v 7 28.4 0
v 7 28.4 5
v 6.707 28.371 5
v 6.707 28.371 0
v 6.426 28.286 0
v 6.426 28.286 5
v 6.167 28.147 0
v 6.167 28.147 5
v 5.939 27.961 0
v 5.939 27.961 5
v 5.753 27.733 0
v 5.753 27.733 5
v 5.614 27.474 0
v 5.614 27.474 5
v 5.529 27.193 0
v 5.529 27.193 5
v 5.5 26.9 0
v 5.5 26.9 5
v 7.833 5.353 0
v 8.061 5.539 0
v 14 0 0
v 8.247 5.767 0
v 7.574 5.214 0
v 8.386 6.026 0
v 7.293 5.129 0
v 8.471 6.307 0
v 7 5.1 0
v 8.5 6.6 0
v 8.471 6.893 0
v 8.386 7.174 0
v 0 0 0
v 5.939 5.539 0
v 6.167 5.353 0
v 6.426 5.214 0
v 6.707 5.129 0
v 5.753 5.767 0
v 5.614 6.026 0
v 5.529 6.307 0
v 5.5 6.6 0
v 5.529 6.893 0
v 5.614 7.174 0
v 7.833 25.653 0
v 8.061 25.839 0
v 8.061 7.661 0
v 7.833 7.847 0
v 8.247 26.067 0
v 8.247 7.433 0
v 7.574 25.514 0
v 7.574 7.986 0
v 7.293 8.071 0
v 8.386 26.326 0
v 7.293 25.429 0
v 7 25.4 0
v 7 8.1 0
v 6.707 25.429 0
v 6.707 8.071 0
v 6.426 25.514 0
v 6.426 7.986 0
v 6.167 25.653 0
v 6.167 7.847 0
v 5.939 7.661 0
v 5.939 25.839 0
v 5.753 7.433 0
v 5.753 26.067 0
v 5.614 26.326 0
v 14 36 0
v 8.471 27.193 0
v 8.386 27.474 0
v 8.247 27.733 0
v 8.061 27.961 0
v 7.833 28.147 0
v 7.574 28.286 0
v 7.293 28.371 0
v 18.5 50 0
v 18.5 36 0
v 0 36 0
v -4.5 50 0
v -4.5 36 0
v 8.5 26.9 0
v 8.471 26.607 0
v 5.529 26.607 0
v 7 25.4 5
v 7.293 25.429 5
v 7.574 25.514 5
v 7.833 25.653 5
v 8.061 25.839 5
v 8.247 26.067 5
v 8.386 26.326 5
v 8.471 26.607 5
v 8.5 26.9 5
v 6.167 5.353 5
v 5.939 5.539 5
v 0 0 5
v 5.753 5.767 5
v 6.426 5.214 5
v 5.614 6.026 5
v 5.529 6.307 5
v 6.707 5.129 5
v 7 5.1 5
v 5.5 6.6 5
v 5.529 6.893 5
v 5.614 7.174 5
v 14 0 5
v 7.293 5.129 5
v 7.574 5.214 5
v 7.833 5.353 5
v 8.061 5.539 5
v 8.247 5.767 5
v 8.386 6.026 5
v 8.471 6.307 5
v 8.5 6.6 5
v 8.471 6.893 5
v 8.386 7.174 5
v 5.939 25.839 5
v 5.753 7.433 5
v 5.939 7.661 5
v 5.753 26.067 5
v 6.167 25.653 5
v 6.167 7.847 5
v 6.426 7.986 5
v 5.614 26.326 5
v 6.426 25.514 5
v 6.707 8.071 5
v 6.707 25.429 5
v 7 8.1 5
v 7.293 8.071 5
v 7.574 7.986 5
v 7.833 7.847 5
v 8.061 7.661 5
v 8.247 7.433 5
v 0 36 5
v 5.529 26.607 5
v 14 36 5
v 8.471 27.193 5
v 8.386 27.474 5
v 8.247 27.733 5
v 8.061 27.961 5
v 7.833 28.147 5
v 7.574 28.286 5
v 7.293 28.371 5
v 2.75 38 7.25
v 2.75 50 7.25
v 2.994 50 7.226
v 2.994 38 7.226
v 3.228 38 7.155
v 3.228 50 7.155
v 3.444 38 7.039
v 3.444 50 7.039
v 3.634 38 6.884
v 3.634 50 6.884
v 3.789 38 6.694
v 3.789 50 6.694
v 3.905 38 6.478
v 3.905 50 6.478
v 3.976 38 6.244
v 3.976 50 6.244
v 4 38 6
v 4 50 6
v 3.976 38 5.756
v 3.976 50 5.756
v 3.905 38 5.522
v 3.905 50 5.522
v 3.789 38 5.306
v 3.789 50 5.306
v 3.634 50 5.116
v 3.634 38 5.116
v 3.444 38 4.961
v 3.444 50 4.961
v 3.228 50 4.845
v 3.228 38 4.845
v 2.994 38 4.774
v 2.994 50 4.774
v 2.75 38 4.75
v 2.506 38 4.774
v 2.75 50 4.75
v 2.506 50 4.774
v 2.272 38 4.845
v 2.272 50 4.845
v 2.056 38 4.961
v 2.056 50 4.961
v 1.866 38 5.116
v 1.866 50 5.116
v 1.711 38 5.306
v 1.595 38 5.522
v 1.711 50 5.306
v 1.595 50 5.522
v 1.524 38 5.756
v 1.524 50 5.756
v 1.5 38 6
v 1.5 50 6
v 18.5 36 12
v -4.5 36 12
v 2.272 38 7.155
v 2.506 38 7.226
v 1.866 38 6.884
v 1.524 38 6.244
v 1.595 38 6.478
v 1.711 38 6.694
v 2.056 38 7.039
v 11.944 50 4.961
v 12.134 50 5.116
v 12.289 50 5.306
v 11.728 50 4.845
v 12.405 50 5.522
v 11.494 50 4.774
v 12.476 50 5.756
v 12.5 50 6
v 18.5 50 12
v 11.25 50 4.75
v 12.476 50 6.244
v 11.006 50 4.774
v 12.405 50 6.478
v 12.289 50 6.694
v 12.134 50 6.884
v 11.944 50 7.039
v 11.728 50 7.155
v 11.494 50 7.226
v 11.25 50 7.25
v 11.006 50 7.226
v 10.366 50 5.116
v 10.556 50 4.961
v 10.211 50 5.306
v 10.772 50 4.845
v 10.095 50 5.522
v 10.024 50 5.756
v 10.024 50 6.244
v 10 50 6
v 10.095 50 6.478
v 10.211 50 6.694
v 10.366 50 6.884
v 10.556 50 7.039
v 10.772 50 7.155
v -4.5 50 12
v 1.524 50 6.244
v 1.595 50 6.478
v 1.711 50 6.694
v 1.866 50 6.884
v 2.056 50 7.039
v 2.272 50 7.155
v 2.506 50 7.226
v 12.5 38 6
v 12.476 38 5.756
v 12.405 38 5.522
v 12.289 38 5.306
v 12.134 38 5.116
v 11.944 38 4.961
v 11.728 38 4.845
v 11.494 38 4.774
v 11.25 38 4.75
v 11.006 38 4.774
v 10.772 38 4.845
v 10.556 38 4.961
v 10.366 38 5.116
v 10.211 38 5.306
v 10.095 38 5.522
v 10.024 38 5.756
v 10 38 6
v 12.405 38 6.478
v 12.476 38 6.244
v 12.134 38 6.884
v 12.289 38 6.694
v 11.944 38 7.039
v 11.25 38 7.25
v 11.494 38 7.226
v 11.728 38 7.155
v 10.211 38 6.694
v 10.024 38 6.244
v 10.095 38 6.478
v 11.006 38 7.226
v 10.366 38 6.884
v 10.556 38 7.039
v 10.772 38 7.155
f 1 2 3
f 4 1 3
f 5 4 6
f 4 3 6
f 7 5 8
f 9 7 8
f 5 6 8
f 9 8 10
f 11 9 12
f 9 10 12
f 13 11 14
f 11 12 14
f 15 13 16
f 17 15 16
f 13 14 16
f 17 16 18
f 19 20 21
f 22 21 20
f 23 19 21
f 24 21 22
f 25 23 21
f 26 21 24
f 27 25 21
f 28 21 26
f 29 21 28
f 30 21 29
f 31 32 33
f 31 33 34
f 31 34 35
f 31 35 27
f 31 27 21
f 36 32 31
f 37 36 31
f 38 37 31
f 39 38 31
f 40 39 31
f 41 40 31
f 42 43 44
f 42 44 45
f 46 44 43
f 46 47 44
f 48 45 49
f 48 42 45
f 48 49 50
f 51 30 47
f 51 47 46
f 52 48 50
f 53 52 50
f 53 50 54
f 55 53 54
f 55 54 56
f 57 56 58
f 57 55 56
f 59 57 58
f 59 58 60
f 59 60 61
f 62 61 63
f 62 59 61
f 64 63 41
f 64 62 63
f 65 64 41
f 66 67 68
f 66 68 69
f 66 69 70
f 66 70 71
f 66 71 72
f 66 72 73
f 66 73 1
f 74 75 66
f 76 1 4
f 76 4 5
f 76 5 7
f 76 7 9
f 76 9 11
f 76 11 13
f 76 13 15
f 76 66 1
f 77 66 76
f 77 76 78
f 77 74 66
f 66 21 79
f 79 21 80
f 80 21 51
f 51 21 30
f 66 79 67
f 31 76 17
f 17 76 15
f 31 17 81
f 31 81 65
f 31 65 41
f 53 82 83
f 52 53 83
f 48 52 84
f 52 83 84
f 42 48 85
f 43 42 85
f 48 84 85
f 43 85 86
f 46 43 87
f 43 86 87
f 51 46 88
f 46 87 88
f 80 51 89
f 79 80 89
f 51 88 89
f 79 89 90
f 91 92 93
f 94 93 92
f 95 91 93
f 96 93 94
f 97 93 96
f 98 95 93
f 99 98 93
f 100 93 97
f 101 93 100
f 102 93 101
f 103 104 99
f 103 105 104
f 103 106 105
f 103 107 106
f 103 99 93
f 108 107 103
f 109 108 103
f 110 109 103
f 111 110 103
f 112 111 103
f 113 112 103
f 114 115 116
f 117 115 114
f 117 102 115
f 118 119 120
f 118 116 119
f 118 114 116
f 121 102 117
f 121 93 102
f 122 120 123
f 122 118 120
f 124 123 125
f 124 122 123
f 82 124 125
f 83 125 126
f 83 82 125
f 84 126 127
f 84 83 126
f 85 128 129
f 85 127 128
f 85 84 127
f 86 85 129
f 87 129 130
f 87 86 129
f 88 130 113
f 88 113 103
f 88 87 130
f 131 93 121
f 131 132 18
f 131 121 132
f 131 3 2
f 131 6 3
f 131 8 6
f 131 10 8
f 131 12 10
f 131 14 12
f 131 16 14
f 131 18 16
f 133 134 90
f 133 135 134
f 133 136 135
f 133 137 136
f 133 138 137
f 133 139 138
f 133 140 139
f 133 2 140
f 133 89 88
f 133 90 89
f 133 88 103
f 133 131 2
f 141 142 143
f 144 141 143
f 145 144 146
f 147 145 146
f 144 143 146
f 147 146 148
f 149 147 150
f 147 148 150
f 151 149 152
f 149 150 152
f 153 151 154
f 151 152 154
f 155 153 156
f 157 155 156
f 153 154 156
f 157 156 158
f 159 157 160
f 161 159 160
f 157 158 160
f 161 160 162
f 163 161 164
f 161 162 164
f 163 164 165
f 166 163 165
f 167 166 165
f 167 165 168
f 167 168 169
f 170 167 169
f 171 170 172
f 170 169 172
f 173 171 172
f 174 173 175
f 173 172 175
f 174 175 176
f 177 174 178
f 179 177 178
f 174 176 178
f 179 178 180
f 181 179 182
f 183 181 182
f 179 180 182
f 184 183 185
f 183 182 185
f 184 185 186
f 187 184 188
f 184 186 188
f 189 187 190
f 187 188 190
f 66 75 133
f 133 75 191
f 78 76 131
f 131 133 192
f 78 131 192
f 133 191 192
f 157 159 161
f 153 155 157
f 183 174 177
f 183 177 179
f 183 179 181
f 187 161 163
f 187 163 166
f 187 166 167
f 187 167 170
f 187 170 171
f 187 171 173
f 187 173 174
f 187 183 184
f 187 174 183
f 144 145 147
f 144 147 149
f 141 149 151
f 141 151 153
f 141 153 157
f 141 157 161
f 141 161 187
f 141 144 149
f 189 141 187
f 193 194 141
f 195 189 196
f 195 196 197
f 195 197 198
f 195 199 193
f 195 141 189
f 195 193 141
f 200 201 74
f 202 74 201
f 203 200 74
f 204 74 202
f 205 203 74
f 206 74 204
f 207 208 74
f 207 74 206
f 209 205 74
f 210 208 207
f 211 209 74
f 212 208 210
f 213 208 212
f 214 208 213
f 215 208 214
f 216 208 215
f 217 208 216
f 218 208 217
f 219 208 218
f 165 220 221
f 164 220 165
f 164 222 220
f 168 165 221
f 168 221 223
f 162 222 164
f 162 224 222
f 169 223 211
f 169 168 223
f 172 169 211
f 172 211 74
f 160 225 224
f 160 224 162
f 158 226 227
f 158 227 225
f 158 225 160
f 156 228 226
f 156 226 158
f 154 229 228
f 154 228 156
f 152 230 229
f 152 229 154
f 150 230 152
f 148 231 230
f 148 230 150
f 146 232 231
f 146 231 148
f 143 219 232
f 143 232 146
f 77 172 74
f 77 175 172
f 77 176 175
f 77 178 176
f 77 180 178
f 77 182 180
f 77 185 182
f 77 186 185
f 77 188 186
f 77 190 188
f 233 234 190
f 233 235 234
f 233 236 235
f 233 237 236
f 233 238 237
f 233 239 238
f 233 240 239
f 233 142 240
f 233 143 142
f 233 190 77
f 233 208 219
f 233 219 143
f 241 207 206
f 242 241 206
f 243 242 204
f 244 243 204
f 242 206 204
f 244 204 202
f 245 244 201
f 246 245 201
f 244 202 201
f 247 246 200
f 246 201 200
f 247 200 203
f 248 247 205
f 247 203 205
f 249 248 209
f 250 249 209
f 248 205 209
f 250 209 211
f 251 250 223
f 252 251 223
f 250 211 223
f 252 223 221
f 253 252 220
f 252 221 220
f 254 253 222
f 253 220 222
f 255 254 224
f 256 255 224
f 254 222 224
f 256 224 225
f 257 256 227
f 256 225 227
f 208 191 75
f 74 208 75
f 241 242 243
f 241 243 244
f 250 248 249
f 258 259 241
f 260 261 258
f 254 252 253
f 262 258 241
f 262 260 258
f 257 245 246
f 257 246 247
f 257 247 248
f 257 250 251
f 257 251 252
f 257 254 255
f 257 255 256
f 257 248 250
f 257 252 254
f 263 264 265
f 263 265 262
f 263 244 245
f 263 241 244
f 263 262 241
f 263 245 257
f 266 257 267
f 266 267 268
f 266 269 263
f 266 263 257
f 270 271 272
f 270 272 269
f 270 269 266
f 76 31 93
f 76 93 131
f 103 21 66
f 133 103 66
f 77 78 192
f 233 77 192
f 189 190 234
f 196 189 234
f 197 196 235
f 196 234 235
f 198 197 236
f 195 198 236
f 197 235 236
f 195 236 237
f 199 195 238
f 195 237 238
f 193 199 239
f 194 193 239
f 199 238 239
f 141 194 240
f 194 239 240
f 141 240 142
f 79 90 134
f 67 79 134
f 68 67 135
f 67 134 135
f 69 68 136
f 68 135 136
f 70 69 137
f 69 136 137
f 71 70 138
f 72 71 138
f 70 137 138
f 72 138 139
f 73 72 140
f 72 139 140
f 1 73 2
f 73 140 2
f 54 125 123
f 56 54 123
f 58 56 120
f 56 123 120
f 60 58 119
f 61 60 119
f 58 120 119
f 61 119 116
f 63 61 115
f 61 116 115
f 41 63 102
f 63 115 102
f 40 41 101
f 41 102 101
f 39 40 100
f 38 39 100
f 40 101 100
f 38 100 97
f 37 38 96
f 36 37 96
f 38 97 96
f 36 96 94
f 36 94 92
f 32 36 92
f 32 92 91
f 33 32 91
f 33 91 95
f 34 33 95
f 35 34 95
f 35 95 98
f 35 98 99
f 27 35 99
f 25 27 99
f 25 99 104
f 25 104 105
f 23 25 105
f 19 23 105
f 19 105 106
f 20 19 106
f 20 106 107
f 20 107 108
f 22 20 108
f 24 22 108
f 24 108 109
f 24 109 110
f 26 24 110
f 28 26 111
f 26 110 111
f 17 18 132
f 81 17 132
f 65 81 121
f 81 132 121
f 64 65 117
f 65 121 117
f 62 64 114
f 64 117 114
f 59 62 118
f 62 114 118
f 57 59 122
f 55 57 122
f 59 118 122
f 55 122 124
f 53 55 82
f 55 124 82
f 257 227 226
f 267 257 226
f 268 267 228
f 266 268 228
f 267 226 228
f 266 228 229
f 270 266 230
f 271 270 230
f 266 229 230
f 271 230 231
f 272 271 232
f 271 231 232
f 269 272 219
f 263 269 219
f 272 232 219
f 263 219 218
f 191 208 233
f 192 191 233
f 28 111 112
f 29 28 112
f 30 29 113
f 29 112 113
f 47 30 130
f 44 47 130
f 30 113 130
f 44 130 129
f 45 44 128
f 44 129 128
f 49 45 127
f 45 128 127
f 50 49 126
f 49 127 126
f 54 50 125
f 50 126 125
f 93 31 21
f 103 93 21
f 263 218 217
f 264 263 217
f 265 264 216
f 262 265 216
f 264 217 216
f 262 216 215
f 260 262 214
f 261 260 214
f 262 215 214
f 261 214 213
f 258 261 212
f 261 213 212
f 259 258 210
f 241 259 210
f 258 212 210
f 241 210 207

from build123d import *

# Parameters (mm, degrees)
F0_W      = 14
F0_H      = 58
F1_DEPTH  = 5
F3_DEPTH  = 25
F5_W      = 23
F5_H      = 3.5
F6_DEPTH  = 19.5
F7_W      = 14
F7_H      = 5
F8_DEPTH  = 8
F10_DEPTH = 12


with BuildPart() as f1:
    # F0 (on Top) → F1 (new body)
    with BuildSketch(Plane.XY):
        with Locations((7, 29)):
            Rectangle(F0_W, F0_H)
    extrude(amount=F1_DEPTH)

    # F2 (on face) → F3 (cut)
    with BuildSketch(Plane.XY.offset(5)):
        with BuildLine():
            ThreePointArc((8.5, 26.9), (8.0606601718, 27.9606601718), (7, 28.4))
            Line((7, 28.4), (7, 26.9))
            Line((7, 26.9), (8.5, 26.9))
        make_face()
        with BuildLine():
            Line((7, 26.9), (7, 28.4))
            ThreePointArc((7, 28.4), (5.9393398282, 27.9606601718), (5.5, 26.9))
            Line((5.5, 26.9), (7, 26.9))
        make_face()
        with BuildLine():
            Line((7, 25.4), (7, 26.9))
            Line((7, 26.9), (5.5, 26.9))
            ThreePointArc((5.5, 26.9), (5.9393398282, 25.8393398282), (7, 25.4))
        make_face()
        with BuildLine():
            Line((8.5, 26.9), (7, 26.9))
            Line((7, 26.9), (7, 25.4))
            ThreePointArc((7, 25.4), (8.0606601718, 25.8393398282), (8.5, 26.9))
        make_face()
        with BuildLine():
            ThreePointArc((8.5, 6.6), (8.0606601718, 7.6606601718), (7, 8.1))
            Line((7, 8.1), (7, 6.6))
            Line((7, 6.6), (8.5, 6.6))
        make_face()
        with BuildLine():
            Line((7, 6.6), (7, 8.1))
            ThreePointArc((7, 8.1), (5.9393398282, 5.5393398282), (8.5, 6.6))
            Line((8.5, 6.6), (7, 6.6))
        make_face()
    extrude(amount=-F3_DEPTH, mode=Mode.SUBTRACT)

    # F5 (on offset) → F6 (join)
    with BuildSketch(Plane(origin=(0, 55.5, 0), x_dir=(-1, 0, 0), z_dir=(0, 1, 0))):
        with Locations((-7, 10.25)):
            Rectangle(F5_W, F5_H)
        Polygon((-18.5, 0), (0, 0), (4.5, 0), (4.5, 8.5), (-18.5, 8.5), align=None)
    extrude(amount=-F6_DEPTH)

    # F7 (on face) → F8 (cut)
    with BuildSketch(Plane(origin=(0, 58, 0), x_dir=(-1, 0, 0), z_dir=(0, 1, 0))):
        with Locations((-7, 2.5)):
            Rectangle(F7_W, F7_H)
        Polygon((-18.5, 0), (-14, 0), (-14, 5), (0, 5), (0, 8.5), (-18.5, 8.5), align=None)
        Polygon((0, 5), (0, 0), (4.5, 0), (4.5, 8.5), (0, 8.5), align=None)
        Polygon((-18.5, 8.5), (0, 8.5), (4.5, 8.5), (4.5, 12), (-18.5, 12), align=None)
    extrude(amount=-F8_DEPTH, mode=Mode.SUBTRACT)

    # F9 (on face) → F10 (cut)
    with BuildSketch(Plane(origin=(0, 50, 0), x_dir=(-1, 0, 0), z_dir=(0, 1, 0))):
        with BuildLine():
            ThreePointArc((-10, 6), (-10.3661165235, 6.8838834765), (-11.25, 7.25))
            Line((-11.25, 7.25), (-11.25, 6))
            Line((-11.25, 6), (-12.5, 6))
            ThreePointArc((-12.5, 6), (-11.25, 4.75), (-10, 6))
        make_face()
        with BuildLine():
            Line((-11.25, 6), (-11.25, 7.25))
            ThreePointArc((-11.25, 7.25), (-12.1338834765, 6.8838834765), (-12.5, 6))
            Line((-12.5, 6), (-11.25, 6))
        make_face()
        with BuildLine():
            ThreePointArc((-1.5, 6), (-1.8661165235, 6.8838834765), (-2.75, 7.25))
            Line((-2.75, 7.25), (-2.75, 6))
            Line((-2.75, 6), (-1.5, 6))
        make_face()
        with BuildLine():
            Line((-2.75, 6), (-2.75, 7.25))
            ThreePointArc((-2.75, 7.25), (-3.6338834765, 5.1161165235), (-1.5, 6))
            Line((-1.5, 6), (-2.75, 6))
        make_face()
    extrude(amount=-F10_DEPTH, mode=Mode.SUBTRACT)


solid = f1.part
